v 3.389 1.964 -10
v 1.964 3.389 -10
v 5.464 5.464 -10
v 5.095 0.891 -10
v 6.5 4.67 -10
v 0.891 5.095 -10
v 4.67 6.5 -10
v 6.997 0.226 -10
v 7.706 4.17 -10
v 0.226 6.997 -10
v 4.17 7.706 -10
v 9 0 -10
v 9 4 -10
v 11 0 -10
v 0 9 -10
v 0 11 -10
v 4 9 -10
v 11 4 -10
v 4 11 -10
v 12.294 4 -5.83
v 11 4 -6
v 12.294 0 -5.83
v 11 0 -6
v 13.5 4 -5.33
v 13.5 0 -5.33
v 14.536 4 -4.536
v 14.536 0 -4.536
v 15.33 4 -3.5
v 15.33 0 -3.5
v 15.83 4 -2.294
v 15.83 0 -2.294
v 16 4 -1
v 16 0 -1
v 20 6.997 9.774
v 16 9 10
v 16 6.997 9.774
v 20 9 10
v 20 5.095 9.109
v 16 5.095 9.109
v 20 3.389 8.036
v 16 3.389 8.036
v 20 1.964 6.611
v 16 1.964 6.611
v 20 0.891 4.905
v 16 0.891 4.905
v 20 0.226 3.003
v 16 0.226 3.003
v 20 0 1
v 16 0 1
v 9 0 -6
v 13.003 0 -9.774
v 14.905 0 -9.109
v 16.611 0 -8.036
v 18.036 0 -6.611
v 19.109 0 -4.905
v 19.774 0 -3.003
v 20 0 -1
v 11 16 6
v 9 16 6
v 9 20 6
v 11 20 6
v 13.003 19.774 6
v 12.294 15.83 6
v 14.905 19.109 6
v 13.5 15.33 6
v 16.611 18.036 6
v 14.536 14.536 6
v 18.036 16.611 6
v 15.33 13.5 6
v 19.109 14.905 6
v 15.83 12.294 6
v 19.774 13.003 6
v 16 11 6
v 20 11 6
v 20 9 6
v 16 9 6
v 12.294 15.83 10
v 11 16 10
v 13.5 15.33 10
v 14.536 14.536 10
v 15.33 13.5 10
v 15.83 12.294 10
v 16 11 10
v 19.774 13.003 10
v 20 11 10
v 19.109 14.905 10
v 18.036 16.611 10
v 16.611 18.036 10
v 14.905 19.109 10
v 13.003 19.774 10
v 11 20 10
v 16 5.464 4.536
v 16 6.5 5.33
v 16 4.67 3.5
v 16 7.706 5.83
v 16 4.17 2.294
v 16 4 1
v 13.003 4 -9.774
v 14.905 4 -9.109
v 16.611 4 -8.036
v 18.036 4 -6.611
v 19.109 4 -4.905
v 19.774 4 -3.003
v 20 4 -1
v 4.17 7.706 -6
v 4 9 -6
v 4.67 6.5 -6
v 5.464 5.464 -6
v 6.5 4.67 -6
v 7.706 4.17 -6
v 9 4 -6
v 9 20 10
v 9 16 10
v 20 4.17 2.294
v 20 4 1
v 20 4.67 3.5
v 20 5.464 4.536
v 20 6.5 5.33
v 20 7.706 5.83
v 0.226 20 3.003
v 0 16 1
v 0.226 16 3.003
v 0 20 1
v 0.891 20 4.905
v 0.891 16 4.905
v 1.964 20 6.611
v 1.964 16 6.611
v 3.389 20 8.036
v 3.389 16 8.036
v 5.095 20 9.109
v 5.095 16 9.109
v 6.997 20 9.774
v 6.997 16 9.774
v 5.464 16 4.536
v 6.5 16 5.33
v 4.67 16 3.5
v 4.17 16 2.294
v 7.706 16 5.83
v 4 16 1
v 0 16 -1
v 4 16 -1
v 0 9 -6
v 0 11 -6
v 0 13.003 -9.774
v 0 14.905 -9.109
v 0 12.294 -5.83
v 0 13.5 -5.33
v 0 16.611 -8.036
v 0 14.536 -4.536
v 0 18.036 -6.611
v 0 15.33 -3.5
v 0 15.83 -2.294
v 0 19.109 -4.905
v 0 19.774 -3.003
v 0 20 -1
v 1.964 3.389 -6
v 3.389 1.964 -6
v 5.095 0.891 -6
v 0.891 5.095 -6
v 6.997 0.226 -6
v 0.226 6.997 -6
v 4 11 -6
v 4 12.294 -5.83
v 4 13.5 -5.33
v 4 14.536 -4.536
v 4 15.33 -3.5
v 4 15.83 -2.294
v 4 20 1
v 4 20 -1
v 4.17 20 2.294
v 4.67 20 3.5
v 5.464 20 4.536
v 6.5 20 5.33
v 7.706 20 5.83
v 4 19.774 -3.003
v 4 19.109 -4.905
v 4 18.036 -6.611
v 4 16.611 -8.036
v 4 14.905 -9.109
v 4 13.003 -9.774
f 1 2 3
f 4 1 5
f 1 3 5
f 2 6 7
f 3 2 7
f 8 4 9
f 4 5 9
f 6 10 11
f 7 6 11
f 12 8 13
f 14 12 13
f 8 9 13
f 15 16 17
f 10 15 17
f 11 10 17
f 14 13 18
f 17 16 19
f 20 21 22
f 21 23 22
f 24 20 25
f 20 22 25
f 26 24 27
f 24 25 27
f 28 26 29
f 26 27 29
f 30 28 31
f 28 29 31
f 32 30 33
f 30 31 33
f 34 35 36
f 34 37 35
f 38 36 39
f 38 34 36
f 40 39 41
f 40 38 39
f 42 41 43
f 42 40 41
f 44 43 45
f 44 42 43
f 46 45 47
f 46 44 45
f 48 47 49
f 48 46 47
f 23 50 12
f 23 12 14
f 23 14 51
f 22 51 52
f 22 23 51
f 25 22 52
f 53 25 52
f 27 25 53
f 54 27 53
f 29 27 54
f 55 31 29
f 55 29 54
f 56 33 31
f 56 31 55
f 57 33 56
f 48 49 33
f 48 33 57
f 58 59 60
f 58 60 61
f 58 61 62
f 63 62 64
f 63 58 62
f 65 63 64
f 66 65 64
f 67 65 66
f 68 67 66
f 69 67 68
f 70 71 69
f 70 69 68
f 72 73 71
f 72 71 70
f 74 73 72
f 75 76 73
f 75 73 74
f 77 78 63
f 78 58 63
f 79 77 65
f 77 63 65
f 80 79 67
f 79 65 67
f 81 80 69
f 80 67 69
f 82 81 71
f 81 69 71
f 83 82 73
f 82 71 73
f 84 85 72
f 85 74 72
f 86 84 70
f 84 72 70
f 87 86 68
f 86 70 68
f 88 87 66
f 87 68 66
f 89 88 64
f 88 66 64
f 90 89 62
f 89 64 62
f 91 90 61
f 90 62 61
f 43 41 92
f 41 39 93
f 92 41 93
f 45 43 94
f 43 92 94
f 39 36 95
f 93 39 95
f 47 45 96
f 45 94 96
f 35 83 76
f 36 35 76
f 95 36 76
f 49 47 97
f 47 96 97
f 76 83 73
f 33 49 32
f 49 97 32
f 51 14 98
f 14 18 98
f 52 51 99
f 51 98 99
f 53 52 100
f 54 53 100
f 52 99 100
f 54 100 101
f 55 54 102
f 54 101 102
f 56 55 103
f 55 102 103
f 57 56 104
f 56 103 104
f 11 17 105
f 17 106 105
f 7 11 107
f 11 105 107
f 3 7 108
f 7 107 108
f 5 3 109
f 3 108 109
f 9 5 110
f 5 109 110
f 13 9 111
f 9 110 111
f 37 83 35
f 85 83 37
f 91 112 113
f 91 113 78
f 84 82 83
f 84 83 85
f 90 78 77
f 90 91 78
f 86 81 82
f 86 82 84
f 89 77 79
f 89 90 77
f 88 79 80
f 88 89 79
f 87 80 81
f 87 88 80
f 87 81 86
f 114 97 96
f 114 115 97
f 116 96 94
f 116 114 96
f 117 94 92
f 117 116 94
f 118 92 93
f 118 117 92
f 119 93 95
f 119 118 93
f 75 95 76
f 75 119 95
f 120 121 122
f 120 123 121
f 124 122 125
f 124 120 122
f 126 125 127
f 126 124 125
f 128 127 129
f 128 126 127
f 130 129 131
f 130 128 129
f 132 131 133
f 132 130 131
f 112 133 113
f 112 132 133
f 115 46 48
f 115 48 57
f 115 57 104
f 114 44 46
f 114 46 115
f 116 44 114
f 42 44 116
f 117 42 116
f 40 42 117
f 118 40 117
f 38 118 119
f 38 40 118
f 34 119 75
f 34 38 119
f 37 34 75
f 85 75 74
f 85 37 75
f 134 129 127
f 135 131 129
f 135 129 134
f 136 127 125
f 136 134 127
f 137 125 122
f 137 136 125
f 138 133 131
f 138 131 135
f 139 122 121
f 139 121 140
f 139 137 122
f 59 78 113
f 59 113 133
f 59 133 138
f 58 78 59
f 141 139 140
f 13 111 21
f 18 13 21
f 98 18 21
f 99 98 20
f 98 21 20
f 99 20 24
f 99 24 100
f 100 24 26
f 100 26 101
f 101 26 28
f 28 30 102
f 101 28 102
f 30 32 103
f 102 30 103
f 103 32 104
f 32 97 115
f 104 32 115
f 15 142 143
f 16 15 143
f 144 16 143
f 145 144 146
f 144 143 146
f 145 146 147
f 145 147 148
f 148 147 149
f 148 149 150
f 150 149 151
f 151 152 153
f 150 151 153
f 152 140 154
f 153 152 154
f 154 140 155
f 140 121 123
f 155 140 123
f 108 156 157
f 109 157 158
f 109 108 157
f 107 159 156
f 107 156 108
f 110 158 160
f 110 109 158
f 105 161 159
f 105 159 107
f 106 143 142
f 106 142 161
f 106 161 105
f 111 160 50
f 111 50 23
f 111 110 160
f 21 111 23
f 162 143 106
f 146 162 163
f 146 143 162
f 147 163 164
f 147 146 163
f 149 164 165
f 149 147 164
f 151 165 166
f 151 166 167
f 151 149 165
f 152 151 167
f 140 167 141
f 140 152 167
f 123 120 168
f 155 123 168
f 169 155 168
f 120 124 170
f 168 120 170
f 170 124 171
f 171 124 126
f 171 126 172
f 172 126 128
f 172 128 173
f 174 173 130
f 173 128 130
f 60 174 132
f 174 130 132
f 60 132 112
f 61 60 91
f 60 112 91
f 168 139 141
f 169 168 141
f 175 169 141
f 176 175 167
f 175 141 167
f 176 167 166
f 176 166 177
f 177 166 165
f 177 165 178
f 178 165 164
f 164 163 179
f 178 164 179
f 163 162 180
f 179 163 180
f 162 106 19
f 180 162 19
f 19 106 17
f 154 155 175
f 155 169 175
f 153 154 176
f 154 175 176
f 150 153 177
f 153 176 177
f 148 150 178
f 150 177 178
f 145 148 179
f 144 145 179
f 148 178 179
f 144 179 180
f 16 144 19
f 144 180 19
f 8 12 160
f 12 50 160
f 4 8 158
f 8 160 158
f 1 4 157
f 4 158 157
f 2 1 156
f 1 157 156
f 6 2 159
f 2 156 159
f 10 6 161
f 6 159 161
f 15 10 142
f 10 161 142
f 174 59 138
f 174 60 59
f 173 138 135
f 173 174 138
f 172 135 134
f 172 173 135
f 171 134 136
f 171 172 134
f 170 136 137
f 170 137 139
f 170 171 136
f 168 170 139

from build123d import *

# Parameters (mm, degrees)
SKETCH1_W               = 20
SKETCH1_H               = 20
BOSS_EXTRUDE1_DEPTH     = 10
SKETCH2_W               = 12
SKETCH2_H               = 12
CUT_EXTRUDE1_DEPTH      = 19
SKETCH3_W               = 12
SKETCH3_H               = 12
CUT_EXTRUDE2_DEPTH      = 31
SKETCH4_W               = 12
SKETCH4_H               = 12
CUT_EXTRUDE3_DEPTH      = 39
CUT_EXTRUDE5_DEPTH      = 21
CUT_EXTRUDE5_DEPTH_BACK = 6
SKETCH5_W               = 16
SKETCH5_H               = 16
CUT_EXTRUDE8_START      = 4
SKETCH6_W               = 17.478582849
SKETCH6_H               = 18.231479144
CUT_EXTRUDE8_DEPTH      = 43
FILLET3_R               = 9
FILLET4_R               = 9
FILLET5_R               = 9
FILLET6_R               = 9
FILLET7_R               = 9
FILLET8_R               = 9
FILLET9_R               = 5
FILLET10_R              = 5
FILLET11_R              = 5
FILLET12_R              = 5
FILLET13_R              = 5
FILLET14_R              = 5


with BuildPart() as part:
    # Sketch1 → Boss-Extrude1 (new, symmetric)
    with BuildSketch(Plane.XY):
        with Locations((10, 10)):
            Rectangle(SKETCH1_W, SKETCH1_H)
    extrude(amount=BOSS_EXTRUDE1_DEPTH, both=True)

    # Sketch2 → Cut-Extrude1 (cut, symmetric)
    with BuildSketch(Plane.XY):
        with Locations((10, 10)):
            Rectangle(SKETCH2_W, SKETCH2_H)
    extrude(amount=CUT_EXTRUDE1_DEPTH, both=True, mode=Mode.SUBTRACT)

    # Sketch3 → Cut-Extrude2 (cut, symmetric)
    with BuildSketch(Plane(origin=(0, 0, 0), x_dir=(1, 0, 0), z_dir=(0, 1, 0))):
        with Locations((10, 0)):
            Rectangle(SKETCH3_W, SKETCH3_H)
    extrude(amount=CUT_EXTRUDE2_DEPTH, both=True, mode=Mode.SUBTRACT)

    # Sketch4 → Cut-Extrude3 (cut, symmetric)
    with BuildSketch(Plane(origin=(0, 0, 0), x_dir=(0, 0, -1), z_dir=(1, 0, 0))):
        with Locations((0, 10)):
            Rectangle(SKETCH4_W, SKETCH4_H)
    extrude(amount=CUT_EXTRUDE3_DEPTH, both=True, mode=Mode.SUBTRACT)

    # Sketch5 → Cut-Extrude5 (cut, two sides: drawn at the far end of the back side and taken through both)
    with BuildSketch(Plane.XY.offset(-CUT_EXTRUDE5_DEPTH_BACK)):
        with Locations((8, 8)):
            Rectangle(SKETCH5_W, SKETCH5_H)
    extrude(amount=CUT_EXTRUDE5_DEPTH + CUT_EXTRUDE5_DEPTH_BACK, mode=Mode.SUBTRACT)

    # Sketch6 → Cut-Extrude8 (cut)
    with BuildSketch(Plane(origin=(0, 0, 0), x_dir=(1, 0, 0), z_dir=(0, 1, 0)).offset(CUT_EXTRUDE8_START)):
        with Locations((12.739291425, 3.115739572)):
            Rectangle(SKETCH6_W, SKETCH6_H)
    extrude(amount=CUT_EXTRUDE8_DEPTH, mode=Mode.SUBTRACT)

    # Fillet3
    fillet3_edges = [part.edges().sort_by_distance(p)[0] for p in [
        (20, 20, 8),
    ]]
    fillet(fillet3_edges, radius=FILLET3_R)

    # Fillet4
    fillet4_edges = [part.edges().sort_by_distance(p)[0] for p in [
        (0, 0, -8),
    ]]
    fillet(fillet4_edges, radius=FILLET4_R)

    # Fillet5
    fillet5_edges = [part.edges().sort_by_distance(p)[0] for p in [
        (20, 2, -10),
    ]]
    fillet(fillet5_edges, radius=FILLET5_R)

    # Fillet6
    fillet6_edges = [part.edges().sort_by_distance(p)[0] for p in [
        (0, 18, 10),
    ]]
    fillet(fillet6_edges, radius=FILLET6_R)

    # Fillet7
    fillet7_edges = [part.edges().sort_by_distance(p)[0] for p in [
        (2, 20, -10),
    ]]
    fillet(fillet7_edges, radius=FILLET7_R)

    # Fillet8
    fillet8_edges = [part.edges().sort_by_distance(p)[0] for p in [
        (18, 0, 10),
    ]]
    fillet(fillet8_edges, radius=FILLET8_R)

    # Fillet9
    fillet9_edges = [part.edges().sort_by_distance(p)[0] for p in [
        (4, 18, 6),
    ]]
    fillet(fillet9_edges, radius=FILLET9_R)

    # Fillet10
    fillet10_edges = [part.edges().sort_by_distance(p)[0] for p in [
        (16, 2, -6),
    ]]
    fillet(fillet10_edges, radius=FILLET10_R)

    # Fillet11
    fillet11_edges = [part.edges().sort_by_distance(p)[0] for p in [
        (16, 16, 8),
    ]]
    fillet(fillet11_edges, radius=FILLET11_R)

    # Fillet12
    fillet12_edges = [part.edges().sort_by_distance(p)[0] for p in [
        (4, 4, -8),
    ]]
    fillet(fillet12_edges, radius=FILLET12_R)

    # Fillet13
    fillet13_edges = [part.edges().sort_by_distance(p)[0] for p in [
        (18, 4, 6),
    ]]
    fillet(fillet13_edges, radius=FILLET13_R)

    # Fillet14
    fillet14_edges = [part.edges().sort_by_distance(p)[0] for p in [
        (2, 16, -6),
    ]]
    fillet(fillet14_edges, radius=FILLET14_R)


solid = part.part
